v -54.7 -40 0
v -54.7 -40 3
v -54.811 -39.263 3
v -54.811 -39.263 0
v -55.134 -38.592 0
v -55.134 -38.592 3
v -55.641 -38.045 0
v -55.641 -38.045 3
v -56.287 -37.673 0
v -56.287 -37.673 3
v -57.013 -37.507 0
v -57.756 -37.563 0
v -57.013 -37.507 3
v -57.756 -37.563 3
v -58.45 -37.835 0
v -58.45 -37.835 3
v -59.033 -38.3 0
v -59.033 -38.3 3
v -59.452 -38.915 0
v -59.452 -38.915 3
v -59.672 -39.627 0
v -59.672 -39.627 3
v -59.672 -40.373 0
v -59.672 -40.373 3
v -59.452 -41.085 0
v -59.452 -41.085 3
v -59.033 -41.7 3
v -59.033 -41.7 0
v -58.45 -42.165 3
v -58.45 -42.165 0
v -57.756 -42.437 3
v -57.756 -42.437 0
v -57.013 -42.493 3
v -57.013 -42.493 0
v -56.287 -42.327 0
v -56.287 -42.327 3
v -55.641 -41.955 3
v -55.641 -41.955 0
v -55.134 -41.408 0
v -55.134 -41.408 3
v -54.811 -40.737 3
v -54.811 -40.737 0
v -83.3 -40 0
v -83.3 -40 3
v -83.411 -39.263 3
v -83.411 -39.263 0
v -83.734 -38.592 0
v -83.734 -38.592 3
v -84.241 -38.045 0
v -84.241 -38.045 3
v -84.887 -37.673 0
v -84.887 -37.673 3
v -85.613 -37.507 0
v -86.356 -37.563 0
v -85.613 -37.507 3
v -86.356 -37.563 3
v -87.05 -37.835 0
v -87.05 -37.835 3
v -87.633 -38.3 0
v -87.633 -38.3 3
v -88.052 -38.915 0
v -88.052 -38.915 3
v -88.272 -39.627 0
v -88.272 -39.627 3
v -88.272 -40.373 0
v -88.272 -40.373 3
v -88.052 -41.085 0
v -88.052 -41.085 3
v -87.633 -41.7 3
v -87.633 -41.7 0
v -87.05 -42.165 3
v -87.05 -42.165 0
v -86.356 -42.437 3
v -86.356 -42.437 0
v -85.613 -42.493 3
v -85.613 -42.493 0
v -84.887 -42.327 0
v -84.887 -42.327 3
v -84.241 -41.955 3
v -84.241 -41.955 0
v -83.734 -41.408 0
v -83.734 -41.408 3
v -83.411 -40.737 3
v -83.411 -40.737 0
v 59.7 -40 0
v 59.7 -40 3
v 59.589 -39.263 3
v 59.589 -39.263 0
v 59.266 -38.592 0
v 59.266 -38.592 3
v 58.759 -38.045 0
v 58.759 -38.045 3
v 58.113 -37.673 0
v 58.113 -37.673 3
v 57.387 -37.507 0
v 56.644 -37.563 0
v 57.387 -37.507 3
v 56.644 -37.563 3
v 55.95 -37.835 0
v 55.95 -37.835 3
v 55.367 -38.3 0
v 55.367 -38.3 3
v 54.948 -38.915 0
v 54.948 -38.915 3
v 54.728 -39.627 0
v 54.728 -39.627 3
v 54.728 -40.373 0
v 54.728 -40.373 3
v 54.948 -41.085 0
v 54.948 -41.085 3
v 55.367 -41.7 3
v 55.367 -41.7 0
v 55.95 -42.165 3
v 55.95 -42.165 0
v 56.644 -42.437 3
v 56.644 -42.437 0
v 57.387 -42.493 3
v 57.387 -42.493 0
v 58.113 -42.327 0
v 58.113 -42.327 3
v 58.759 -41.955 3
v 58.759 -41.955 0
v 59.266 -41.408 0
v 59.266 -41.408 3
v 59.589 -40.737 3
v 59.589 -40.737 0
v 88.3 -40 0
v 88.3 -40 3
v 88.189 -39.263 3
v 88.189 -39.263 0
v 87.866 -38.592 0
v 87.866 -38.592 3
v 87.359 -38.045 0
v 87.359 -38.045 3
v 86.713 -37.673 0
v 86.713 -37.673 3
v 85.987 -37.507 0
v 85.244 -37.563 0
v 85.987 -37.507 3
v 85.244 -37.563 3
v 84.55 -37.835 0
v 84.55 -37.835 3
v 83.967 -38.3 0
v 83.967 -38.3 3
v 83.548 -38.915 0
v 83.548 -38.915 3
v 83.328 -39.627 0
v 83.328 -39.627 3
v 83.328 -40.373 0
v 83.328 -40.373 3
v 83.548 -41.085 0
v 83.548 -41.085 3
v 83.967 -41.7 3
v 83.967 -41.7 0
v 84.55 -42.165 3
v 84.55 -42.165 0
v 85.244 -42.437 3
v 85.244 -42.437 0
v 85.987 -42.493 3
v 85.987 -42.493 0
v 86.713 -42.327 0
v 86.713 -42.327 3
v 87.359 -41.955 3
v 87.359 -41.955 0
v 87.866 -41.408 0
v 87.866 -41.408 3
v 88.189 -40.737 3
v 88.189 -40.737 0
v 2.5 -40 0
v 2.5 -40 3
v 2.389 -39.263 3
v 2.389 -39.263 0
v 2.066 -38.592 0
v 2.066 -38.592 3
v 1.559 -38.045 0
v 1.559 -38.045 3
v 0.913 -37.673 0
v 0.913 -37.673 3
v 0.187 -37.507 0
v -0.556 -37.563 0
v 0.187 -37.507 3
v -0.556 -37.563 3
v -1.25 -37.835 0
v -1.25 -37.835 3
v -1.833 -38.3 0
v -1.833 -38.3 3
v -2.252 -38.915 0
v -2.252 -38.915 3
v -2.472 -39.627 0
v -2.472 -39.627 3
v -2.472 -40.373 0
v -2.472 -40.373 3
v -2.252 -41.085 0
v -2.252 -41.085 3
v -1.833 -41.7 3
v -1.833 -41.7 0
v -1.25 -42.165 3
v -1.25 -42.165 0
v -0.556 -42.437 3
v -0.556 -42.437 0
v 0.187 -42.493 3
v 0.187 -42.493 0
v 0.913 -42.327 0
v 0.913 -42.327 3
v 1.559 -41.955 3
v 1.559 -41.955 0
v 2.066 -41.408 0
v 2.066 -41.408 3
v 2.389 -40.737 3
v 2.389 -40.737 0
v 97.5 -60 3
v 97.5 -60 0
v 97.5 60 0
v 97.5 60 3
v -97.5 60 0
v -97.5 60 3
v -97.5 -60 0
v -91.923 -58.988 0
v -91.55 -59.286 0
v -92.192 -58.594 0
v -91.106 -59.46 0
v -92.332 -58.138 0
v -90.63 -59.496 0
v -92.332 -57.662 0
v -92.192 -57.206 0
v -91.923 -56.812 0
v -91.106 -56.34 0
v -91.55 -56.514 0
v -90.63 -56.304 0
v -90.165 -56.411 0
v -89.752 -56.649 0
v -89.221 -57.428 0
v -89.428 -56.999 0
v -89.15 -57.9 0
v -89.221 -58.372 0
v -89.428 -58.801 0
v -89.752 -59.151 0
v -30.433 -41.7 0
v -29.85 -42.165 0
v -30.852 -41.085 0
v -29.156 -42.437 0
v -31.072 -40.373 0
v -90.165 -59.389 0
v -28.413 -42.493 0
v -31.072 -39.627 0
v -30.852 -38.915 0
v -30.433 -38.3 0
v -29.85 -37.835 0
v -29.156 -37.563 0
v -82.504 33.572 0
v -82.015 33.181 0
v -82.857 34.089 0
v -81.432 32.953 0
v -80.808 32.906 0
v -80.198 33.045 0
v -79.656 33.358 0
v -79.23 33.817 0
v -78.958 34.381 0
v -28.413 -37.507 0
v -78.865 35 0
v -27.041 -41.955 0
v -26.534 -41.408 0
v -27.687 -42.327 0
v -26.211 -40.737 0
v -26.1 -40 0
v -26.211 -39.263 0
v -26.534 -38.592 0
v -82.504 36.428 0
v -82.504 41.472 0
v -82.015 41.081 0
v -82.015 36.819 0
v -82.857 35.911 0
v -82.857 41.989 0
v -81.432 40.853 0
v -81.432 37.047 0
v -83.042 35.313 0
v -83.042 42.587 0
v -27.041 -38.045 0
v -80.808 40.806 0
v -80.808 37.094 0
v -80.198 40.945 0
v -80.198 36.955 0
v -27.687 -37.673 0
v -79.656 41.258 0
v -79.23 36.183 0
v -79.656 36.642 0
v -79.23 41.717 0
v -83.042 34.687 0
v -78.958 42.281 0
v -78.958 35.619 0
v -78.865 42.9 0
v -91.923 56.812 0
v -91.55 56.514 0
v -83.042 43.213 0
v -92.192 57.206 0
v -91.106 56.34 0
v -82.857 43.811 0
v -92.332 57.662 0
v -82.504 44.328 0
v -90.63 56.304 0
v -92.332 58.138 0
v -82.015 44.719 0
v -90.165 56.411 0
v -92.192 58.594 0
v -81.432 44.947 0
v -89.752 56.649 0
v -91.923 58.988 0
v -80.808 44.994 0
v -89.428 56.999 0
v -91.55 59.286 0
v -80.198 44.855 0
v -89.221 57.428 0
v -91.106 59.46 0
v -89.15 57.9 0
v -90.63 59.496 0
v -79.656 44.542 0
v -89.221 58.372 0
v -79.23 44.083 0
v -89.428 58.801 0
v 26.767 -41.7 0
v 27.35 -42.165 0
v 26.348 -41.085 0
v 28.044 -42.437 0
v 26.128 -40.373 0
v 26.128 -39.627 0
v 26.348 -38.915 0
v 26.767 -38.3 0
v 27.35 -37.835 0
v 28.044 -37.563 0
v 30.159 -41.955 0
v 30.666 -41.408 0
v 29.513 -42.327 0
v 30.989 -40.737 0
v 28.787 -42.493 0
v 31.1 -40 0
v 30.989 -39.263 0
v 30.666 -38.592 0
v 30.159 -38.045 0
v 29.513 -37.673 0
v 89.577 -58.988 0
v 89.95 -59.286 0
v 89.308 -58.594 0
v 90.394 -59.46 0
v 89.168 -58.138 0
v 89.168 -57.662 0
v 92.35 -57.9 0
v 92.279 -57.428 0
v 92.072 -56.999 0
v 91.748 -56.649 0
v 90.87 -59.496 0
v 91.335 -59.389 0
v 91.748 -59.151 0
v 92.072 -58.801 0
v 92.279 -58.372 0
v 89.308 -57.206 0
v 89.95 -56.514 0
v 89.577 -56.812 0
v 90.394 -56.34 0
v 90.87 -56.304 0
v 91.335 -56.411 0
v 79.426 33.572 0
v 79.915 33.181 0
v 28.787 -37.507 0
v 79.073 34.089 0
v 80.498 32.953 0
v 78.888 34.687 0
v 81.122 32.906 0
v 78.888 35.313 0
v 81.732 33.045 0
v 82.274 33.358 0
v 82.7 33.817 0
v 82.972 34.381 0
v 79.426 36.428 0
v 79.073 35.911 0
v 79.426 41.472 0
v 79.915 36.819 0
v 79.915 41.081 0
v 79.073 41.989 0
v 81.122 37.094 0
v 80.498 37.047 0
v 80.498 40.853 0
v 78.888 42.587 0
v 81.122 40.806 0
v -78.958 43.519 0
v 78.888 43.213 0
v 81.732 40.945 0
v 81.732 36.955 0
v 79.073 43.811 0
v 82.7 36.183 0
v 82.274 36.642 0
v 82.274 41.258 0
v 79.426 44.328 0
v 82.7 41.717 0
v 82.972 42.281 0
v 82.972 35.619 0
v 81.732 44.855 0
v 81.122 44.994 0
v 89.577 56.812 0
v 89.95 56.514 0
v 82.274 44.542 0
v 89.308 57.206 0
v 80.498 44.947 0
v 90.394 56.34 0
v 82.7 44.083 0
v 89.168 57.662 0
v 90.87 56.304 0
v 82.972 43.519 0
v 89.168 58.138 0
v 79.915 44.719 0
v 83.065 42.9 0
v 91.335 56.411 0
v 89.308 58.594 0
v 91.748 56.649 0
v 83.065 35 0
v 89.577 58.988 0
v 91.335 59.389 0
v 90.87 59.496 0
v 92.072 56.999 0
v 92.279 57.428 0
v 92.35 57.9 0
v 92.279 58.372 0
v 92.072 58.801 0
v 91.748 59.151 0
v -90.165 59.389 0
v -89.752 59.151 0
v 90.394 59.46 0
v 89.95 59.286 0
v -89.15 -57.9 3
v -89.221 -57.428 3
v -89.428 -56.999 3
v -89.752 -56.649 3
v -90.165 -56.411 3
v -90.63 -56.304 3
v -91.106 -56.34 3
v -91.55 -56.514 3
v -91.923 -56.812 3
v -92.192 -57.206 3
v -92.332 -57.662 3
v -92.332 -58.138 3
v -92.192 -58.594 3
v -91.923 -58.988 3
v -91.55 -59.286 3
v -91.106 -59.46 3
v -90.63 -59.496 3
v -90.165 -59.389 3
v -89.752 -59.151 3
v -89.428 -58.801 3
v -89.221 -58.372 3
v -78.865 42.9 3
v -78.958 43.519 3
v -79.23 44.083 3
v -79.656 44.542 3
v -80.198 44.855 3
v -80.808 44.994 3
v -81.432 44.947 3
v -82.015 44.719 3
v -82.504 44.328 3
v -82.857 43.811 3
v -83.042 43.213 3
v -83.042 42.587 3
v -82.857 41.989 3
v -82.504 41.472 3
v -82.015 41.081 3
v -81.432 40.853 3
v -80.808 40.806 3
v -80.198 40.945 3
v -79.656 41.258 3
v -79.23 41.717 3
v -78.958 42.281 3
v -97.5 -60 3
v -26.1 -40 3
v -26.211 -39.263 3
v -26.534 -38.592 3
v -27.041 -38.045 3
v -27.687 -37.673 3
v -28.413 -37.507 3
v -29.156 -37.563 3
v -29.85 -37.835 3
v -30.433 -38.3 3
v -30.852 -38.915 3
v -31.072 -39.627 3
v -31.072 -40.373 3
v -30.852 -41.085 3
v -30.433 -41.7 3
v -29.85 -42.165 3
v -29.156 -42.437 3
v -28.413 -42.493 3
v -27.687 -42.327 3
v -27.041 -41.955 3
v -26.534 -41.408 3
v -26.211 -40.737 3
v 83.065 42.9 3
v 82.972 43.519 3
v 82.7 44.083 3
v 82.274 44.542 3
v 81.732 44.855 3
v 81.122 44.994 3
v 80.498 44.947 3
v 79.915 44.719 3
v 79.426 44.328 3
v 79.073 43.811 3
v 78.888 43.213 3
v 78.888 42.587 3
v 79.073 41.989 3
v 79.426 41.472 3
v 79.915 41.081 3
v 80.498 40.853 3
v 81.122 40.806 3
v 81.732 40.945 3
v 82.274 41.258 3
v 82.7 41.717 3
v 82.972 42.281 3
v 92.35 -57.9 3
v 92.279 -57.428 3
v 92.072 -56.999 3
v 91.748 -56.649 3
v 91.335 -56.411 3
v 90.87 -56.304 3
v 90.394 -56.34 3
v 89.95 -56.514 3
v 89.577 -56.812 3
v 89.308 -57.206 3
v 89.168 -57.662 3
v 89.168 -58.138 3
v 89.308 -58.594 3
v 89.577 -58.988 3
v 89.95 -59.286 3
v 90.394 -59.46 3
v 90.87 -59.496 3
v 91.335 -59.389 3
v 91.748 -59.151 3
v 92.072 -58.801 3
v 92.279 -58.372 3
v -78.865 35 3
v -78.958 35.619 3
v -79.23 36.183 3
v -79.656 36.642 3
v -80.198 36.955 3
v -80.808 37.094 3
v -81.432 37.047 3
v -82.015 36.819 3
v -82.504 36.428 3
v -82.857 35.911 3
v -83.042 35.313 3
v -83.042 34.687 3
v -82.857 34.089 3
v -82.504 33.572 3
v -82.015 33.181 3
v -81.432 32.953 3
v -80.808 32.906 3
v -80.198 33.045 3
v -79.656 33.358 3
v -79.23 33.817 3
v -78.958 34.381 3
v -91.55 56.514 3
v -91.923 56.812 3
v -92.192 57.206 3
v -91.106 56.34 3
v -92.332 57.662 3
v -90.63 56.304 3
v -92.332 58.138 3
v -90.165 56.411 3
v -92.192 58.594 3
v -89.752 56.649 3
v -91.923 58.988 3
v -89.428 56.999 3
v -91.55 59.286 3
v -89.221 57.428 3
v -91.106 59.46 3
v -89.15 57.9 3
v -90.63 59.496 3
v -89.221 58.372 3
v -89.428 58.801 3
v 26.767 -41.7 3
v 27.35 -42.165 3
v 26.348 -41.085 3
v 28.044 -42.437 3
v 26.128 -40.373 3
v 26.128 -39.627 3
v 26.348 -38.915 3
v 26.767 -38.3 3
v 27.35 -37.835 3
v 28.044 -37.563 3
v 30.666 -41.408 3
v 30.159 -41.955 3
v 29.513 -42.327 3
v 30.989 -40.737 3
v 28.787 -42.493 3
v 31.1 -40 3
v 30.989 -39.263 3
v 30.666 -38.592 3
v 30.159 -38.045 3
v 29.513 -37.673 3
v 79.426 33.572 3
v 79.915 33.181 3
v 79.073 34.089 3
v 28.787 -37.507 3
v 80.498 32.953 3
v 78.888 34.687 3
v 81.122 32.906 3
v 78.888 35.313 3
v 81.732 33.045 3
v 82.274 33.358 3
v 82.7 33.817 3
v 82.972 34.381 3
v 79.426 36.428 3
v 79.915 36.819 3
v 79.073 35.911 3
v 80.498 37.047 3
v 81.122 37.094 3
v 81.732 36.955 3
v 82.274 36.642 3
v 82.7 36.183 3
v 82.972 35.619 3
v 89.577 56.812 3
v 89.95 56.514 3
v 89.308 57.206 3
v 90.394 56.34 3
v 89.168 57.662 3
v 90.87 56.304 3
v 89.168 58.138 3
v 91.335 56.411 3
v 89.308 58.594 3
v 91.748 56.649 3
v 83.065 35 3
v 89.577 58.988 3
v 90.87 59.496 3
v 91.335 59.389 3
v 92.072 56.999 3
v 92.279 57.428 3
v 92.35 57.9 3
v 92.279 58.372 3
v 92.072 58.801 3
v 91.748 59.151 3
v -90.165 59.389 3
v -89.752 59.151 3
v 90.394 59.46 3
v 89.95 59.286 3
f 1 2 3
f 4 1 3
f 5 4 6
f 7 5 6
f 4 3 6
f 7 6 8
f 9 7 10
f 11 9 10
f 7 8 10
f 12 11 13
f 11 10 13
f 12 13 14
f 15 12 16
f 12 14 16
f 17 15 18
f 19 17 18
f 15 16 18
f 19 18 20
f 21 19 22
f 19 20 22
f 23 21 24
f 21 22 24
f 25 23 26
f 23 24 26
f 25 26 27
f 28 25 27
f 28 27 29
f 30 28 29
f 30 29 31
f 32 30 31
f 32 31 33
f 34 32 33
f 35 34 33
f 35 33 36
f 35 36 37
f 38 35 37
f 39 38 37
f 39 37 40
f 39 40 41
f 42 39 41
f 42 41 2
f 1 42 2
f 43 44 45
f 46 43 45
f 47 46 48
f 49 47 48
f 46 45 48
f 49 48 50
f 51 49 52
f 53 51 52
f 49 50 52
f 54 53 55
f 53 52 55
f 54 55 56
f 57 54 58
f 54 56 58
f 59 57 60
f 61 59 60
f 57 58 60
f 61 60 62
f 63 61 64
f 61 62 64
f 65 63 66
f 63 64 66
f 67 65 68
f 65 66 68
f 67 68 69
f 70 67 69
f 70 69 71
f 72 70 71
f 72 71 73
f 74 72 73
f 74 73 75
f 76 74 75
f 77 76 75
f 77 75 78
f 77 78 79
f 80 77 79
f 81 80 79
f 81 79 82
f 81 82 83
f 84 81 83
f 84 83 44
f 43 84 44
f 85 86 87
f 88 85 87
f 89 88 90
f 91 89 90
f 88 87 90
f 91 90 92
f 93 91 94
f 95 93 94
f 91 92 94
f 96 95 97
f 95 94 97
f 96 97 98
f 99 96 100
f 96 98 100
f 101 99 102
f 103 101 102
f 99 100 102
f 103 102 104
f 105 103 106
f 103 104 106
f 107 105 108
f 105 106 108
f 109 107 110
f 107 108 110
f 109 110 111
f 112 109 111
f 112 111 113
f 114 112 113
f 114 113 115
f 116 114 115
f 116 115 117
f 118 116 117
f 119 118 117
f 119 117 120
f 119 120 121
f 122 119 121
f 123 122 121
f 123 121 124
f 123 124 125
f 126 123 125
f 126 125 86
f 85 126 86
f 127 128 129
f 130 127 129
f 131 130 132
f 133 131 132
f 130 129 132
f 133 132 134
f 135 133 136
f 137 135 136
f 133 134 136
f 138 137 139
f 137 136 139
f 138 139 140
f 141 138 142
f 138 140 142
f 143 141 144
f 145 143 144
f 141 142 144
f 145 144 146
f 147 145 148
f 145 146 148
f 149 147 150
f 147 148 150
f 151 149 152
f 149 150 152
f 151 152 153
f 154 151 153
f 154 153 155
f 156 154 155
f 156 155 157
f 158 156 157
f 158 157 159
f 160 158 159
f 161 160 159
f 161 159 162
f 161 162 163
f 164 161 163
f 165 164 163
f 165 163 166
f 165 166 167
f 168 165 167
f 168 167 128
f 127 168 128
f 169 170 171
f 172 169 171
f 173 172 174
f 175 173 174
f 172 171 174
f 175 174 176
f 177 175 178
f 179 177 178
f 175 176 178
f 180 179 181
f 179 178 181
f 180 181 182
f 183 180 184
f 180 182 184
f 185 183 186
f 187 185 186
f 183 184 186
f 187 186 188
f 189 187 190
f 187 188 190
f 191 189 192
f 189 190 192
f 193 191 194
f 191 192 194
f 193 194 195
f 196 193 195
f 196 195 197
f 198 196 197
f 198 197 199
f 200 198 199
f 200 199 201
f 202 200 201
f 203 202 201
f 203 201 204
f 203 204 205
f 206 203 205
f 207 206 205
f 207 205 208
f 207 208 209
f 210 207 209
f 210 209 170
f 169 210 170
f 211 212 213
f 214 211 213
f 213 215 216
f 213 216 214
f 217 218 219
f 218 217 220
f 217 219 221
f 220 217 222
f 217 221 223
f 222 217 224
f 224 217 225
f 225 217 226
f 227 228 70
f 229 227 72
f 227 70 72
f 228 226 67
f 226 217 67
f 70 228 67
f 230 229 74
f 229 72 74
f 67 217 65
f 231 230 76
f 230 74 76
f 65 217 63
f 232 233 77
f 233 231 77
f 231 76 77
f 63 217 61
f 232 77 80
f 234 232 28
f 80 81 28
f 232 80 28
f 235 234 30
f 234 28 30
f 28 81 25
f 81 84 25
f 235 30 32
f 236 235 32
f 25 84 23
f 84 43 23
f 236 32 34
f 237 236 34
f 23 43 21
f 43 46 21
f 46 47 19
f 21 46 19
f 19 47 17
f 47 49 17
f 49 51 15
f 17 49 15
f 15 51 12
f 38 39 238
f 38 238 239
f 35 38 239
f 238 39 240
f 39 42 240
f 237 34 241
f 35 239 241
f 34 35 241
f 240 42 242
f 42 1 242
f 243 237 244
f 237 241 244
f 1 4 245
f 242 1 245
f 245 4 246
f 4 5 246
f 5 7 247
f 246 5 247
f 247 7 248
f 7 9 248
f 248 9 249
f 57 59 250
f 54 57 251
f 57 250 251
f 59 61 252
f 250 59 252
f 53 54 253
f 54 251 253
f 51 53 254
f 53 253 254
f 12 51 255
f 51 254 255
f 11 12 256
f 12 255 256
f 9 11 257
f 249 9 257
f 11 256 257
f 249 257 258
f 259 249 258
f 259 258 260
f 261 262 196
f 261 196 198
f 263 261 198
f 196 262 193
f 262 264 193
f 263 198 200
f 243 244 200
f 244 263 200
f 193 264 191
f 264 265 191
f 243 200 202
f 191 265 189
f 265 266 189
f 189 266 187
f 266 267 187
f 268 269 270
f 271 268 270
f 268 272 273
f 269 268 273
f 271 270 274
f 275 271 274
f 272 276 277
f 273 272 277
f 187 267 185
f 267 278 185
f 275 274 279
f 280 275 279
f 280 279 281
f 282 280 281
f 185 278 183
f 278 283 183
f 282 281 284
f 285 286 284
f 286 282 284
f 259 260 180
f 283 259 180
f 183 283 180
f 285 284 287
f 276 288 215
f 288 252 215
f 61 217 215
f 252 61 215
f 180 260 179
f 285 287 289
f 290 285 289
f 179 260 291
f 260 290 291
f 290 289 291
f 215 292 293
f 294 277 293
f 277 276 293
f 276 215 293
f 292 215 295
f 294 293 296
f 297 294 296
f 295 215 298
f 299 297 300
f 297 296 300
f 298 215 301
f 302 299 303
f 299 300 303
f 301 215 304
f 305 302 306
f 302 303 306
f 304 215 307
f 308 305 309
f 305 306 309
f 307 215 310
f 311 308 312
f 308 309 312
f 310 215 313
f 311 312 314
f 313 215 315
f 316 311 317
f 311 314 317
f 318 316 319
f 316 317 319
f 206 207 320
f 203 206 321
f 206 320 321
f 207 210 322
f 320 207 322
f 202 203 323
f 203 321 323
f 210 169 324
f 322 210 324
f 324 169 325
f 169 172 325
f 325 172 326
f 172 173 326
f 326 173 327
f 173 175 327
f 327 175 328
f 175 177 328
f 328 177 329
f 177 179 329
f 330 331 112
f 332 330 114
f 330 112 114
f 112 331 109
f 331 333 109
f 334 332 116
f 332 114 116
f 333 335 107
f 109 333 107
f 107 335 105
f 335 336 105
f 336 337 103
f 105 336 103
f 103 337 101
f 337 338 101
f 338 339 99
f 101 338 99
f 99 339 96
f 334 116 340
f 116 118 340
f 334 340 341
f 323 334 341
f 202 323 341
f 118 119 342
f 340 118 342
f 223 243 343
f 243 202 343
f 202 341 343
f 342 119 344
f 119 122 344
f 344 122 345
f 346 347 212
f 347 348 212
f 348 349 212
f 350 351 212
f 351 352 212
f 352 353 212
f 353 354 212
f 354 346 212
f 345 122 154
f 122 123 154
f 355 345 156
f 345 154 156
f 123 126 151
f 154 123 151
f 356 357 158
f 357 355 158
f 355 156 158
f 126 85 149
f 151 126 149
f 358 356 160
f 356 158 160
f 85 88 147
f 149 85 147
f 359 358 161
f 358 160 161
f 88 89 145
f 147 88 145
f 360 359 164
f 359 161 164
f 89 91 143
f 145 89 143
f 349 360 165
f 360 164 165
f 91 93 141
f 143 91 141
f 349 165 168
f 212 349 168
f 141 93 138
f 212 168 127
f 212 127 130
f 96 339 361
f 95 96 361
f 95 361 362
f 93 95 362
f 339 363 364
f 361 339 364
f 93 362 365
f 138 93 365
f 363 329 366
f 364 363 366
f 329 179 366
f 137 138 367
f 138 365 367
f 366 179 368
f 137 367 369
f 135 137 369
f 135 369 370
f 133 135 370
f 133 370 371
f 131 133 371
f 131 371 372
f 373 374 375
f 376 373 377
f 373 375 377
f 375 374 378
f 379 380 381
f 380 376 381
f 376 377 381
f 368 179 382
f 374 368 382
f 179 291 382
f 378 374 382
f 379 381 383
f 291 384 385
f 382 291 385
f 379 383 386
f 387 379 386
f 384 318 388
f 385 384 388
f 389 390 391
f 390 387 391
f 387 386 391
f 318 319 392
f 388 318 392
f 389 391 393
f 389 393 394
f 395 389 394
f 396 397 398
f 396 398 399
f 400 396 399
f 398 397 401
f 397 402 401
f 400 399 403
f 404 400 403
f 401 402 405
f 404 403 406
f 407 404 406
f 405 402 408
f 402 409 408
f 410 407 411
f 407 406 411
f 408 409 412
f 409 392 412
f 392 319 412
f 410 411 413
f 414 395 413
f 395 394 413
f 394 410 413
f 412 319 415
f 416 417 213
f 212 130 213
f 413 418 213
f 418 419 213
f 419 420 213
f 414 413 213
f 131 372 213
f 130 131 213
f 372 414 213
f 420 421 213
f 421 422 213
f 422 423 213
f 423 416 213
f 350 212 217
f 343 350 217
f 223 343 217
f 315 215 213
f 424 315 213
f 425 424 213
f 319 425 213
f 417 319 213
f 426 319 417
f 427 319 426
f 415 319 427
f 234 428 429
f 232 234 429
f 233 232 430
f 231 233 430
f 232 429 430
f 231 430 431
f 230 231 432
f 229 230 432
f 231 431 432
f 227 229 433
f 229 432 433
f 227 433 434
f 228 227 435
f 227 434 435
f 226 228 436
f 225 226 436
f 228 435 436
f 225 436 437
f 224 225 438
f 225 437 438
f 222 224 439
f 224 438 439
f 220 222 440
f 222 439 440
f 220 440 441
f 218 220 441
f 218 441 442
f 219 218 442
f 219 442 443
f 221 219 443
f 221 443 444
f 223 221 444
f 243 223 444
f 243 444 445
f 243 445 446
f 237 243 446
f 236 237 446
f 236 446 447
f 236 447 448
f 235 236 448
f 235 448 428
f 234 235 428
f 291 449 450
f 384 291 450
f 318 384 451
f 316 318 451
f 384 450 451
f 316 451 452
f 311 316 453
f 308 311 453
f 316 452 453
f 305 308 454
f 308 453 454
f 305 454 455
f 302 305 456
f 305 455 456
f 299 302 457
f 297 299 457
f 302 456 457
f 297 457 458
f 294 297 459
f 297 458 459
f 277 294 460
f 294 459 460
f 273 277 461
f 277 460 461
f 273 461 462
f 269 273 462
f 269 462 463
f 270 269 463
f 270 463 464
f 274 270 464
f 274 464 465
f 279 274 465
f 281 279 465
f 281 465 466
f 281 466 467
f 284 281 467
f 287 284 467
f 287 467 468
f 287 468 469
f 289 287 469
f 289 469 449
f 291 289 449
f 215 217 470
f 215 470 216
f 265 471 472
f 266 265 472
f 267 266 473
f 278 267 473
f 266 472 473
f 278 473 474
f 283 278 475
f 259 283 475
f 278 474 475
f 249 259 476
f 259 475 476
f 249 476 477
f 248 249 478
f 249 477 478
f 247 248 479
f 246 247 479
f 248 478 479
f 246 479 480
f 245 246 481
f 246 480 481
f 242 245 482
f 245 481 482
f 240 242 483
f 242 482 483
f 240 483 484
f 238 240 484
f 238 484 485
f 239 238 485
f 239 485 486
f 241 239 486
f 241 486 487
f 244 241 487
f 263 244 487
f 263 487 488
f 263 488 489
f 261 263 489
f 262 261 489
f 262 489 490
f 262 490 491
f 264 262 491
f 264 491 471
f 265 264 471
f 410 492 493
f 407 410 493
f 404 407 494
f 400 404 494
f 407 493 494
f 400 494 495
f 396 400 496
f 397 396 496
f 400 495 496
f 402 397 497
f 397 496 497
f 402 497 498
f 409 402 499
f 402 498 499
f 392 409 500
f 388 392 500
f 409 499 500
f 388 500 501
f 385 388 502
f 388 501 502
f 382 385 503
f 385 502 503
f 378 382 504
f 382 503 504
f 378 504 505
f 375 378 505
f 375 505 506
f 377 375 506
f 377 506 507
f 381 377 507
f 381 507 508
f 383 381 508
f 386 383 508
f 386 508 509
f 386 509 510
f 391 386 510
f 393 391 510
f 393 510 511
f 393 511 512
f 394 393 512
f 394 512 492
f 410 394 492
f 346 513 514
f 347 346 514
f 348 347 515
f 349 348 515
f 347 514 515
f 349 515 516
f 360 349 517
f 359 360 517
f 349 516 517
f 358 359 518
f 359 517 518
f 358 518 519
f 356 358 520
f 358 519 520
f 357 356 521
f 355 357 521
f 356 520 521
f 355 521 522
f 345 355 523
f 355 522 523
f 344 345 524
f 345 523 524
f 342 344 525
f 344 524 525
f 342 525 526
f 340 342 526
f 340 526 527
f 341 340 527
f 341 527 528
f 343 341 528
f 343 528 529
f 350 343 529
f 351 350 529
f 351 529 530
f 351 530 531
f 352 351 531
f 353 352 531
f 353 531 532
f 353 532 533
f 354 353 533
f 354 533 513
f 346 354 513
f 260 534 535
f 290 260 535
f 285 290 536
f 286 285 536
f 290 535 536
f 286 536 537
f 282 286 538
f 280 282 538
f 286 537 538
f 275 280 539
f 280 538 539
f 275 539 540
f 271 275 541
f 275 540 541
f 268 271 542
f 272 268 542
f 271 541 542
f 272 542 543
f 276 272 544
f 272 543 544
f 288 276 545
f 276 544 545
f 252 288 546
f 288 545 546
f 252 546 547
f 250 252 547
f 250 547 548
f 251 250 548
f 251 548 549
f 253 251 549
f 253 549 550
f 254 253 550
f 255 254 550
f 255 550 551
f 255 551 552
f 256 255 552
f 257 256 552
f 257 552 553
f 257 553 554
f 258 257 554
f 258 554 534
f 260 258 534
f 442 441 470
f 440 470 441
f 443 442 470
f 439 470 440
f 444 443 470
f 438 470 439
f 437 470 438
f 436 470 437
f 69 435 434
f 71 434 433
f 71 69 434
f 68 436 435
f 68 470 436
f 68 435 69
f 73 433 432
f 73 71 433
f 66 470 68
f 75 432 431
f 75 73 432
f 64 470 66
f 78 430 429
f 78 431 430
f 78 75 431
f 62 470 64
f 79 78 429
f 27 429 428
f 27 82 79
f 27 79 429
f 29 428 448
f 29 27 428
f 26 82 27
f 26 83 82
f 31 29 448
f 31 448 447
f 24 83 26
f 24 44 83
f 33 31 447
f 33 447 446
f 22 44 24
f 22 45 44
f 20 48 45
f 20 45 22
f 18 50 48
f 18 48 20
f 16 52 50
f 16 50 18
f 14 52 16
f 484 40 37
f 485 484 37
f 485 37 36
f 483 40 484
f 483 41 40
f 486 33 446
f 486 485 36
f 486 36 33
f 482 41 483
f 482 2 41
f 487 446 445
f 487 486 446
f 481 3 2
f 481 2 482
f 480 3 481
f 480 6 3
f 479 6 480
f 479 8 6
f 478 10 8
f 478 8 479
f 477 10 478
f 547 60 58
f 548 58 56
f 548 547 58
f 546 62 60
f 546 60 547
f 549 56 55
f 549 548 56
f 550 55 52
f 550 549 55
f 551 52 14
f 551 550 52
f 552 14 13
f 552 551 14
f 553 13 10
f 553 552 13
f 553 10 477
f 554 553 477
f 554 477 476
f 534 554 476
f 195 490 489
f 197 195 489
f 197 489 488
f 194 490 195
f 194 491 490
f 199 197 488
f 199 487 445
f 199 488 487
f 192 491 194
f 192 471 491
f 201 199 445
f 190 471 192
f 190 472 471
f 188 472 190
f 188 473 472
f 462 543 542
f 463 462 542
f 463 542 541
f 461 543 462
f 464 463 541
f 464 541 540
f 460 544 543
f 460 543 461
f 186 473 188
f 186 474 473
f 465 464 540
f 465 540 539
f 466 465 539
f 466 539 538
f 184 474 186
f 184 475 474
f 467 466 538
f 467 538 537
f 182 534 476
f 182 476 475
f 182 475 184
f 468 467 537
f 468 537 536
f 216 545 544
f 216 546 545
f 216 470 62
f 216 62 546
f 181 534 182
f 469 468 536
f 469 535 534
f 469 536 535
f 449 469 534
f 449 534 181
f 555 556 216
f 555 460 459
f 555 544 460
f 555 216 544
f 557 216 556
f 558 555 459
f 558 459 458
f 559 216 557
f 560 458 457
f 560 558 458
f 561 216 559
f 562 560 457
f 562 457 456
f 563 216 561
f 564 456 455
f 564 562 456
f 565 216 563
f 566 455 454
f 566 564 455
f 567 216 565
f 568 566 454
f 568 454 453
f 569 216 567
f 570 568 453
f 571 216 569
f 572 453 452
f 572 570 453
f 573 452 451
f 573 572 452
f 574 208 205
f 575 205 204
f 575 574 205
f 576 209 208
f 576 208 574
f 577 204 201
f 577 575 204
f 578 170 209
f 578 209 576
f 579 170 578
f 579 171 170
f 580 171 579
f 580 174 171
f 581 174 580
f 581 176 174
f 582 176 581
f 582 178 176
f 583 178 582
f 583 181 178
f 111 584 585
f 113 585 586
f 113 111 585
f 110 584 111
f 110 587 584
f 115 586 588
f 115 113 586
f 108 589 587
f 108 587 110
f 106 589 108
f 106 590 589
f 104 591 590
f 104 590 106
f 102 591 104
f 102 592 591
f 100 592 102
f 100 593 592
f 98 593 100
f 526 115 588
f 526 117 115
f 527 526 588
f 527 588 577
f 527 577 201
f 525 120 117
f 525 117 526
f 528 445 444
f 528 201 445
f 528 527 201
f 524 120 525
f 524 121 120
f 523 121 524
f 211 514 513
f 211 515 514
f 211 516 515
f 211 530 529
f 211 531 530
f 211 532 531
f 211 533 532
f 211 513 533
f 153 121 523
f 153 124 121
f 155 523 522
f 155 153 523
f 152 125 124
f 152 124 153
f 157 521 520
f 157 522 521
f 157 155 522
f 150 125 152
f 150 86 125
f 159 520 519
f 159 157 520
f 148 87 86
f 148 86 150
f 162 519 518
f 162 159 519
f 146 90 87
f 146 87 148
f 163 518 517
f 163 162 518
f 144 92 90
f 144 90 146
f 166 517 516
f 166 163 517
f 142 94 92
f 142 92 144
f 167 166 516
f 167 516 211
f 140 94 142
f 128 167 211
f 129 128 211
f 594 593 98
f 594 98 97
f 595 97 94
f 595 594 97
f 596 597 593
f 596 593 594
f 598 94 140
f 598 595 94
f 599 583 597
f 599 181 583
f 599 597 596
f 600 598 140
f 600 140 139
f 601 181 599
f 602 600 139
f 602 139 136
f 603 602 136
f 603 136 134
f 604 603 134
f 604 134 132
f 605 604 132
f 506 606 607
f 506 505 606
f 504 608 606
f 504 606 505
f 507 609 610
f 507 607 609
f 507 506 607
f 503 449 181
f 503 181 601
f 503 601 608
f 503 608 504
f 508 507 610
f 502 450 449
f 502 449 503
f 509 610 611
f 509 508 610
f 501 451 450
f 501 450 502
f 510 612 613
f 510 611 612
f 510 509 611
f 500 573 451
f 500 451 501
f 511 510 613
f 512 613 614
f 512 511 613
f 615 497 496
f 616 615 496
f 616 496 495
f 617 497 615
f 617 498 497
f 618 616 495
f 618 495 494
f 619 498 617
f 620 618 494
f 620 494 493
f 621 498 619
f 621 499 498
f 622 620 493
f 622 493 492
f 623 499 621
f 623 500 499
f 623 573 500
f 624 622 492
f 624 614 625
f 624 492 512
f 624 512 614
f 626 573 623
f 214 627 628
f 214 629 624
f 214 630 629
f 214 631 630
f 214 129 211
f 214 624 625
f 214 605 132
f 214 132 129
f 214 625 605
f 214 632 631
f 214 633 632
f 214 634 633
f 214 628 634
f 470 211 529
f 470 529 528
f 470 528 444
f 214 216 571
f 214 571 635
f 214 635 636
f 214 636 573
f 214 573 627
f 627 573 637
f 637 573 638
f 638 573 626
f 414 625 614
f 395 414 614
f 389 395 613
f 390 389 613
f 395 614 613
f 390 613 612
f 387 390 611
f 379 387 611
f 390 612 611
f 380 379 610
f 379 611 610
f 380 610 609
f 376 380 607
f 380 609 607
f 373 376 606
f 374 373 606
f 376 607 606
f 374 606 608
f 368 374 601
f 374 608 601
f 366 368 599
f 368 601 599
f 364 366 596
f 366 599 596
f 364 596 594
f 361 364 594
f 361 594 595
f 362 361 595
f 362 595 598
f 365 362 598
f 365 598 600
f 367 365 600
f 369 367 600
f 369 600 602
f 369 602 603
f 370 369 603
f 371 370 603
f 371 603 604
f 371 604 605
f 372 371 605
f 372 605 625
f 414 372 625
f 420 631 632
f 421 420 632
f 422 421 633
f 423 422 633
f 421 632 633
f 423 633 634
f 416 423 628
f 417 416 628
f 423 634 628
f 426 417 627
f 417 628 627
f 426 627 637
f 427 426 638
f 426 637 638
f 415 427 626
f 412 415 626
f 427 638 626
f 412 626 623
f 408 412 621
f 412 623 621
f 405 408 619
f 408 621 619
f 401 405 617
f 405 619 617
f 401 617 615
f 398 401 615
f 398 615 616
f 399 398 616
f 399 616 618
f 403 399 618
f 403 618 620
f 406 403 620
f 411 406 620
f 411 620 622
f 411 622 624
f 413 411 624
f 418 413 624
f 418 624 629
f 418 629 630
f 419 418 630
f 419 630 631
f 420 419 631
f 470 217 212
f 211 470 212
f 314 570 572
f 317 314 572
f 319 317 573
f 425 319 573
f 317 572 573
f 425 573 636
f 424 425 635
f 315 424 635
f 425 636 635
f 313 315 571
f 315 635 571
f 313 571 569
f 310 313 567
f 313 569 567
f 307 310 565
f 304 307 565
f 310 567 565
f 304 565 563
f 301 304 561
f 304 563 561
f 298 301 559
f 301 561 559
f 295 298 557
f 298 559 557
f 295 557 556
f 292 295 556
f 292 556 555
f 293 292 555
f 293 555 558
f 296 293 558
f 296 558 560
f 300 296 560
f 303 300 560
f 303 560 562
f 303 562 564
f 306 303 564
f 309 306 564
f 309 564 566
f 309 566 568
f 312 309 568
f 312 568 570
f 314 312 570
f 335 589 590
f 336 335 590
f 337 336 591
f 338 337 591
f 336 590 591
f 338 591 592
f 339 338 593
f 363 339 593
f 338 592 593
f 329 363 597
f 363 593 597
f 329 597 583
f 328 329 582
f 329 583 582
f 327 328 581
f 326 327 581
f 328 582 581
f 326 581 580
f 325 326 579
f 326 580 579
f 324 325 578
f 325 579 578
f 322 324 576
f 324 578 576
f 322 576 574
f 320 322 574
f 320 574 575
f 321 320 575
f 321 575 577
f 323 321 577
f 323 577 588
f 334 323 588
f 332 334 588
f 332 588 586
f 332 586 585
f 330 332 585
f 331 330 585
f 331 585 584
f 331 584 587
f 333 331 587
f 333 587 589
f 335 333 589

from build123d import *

# Parameters (mm, degrees)
SKETCH_W        = 195
SKETCH_H        = 120
PAD_DEPTH       = 3
SKETCH001_R     = 1.6
POCKET_DEPTH    = 5
SKETCH002_R     = 2.5
SKETCH002_R_2   = 2.1
POCKET001_DEPTH = 5


with BuildPart() as part:
    # Sketch → Pad (new body)
    with BuildSketch(Plane.XY):
        Rectangle(SKETCH_W, SKETCH_H)
    extrude(amount=PAD_DEPTH)

    # Sketch001 → Pocket (cut)
    with BuildSketch(Plane.XY.offset(3)):
        with Locations((-90.75, 57.9)):
            Circle(SKETCH001_R)
        with Locations((90.75, 57.9)):
            Circle(SKETCH001_R)
        with Locations((-90.75, -57.9)):
            Circle(SKETCH001_R)
        with Locations((90.75, -57.9)):
            Circle(SKETCH001_R)
    extrude(amount=-POCKET_DEPTH, mode=Mode.SUBTRACT)

    # Sketch002 → Pocket001 (cut)
    with BuildSketch(Plane.XY.offset(3)):
        with Locations((-57.2, -40)):
            Circle(SKETCH002_R)
        with Locations((-28.6, -40)):
            Circle(SKETCH002_R)
        with Locations((0, -40)):
            Circle(SKETCH002_R)
        with Locations((28.6, -40)):
            Circle(SKETCH002_R)
        with Locations((57.2, -40)):
            Circle(SKETCH002_R)
        with Locations((-80.965, 42.9)):
            Circle(SKETCH002_R_2)
        with Locations((-80.965, 35)):
            Circle(SKETCH002_R_2)
        with Locations((80.965, 42.9)):
            Circle(SKETCH002_R_2)
        with Locations((80.965, 35)):
            Circle(SKETCH002_R_2)
        with Locations((-85.8, -40)):
            Circle(SKETCH002_R)
        with Locations((85.8, -40)):
            Circle(SKETCH002_R)
    extrude(amount=-POCKET001_DEPTH, mode=Mode.SUBTRACT)


solid = part.part
